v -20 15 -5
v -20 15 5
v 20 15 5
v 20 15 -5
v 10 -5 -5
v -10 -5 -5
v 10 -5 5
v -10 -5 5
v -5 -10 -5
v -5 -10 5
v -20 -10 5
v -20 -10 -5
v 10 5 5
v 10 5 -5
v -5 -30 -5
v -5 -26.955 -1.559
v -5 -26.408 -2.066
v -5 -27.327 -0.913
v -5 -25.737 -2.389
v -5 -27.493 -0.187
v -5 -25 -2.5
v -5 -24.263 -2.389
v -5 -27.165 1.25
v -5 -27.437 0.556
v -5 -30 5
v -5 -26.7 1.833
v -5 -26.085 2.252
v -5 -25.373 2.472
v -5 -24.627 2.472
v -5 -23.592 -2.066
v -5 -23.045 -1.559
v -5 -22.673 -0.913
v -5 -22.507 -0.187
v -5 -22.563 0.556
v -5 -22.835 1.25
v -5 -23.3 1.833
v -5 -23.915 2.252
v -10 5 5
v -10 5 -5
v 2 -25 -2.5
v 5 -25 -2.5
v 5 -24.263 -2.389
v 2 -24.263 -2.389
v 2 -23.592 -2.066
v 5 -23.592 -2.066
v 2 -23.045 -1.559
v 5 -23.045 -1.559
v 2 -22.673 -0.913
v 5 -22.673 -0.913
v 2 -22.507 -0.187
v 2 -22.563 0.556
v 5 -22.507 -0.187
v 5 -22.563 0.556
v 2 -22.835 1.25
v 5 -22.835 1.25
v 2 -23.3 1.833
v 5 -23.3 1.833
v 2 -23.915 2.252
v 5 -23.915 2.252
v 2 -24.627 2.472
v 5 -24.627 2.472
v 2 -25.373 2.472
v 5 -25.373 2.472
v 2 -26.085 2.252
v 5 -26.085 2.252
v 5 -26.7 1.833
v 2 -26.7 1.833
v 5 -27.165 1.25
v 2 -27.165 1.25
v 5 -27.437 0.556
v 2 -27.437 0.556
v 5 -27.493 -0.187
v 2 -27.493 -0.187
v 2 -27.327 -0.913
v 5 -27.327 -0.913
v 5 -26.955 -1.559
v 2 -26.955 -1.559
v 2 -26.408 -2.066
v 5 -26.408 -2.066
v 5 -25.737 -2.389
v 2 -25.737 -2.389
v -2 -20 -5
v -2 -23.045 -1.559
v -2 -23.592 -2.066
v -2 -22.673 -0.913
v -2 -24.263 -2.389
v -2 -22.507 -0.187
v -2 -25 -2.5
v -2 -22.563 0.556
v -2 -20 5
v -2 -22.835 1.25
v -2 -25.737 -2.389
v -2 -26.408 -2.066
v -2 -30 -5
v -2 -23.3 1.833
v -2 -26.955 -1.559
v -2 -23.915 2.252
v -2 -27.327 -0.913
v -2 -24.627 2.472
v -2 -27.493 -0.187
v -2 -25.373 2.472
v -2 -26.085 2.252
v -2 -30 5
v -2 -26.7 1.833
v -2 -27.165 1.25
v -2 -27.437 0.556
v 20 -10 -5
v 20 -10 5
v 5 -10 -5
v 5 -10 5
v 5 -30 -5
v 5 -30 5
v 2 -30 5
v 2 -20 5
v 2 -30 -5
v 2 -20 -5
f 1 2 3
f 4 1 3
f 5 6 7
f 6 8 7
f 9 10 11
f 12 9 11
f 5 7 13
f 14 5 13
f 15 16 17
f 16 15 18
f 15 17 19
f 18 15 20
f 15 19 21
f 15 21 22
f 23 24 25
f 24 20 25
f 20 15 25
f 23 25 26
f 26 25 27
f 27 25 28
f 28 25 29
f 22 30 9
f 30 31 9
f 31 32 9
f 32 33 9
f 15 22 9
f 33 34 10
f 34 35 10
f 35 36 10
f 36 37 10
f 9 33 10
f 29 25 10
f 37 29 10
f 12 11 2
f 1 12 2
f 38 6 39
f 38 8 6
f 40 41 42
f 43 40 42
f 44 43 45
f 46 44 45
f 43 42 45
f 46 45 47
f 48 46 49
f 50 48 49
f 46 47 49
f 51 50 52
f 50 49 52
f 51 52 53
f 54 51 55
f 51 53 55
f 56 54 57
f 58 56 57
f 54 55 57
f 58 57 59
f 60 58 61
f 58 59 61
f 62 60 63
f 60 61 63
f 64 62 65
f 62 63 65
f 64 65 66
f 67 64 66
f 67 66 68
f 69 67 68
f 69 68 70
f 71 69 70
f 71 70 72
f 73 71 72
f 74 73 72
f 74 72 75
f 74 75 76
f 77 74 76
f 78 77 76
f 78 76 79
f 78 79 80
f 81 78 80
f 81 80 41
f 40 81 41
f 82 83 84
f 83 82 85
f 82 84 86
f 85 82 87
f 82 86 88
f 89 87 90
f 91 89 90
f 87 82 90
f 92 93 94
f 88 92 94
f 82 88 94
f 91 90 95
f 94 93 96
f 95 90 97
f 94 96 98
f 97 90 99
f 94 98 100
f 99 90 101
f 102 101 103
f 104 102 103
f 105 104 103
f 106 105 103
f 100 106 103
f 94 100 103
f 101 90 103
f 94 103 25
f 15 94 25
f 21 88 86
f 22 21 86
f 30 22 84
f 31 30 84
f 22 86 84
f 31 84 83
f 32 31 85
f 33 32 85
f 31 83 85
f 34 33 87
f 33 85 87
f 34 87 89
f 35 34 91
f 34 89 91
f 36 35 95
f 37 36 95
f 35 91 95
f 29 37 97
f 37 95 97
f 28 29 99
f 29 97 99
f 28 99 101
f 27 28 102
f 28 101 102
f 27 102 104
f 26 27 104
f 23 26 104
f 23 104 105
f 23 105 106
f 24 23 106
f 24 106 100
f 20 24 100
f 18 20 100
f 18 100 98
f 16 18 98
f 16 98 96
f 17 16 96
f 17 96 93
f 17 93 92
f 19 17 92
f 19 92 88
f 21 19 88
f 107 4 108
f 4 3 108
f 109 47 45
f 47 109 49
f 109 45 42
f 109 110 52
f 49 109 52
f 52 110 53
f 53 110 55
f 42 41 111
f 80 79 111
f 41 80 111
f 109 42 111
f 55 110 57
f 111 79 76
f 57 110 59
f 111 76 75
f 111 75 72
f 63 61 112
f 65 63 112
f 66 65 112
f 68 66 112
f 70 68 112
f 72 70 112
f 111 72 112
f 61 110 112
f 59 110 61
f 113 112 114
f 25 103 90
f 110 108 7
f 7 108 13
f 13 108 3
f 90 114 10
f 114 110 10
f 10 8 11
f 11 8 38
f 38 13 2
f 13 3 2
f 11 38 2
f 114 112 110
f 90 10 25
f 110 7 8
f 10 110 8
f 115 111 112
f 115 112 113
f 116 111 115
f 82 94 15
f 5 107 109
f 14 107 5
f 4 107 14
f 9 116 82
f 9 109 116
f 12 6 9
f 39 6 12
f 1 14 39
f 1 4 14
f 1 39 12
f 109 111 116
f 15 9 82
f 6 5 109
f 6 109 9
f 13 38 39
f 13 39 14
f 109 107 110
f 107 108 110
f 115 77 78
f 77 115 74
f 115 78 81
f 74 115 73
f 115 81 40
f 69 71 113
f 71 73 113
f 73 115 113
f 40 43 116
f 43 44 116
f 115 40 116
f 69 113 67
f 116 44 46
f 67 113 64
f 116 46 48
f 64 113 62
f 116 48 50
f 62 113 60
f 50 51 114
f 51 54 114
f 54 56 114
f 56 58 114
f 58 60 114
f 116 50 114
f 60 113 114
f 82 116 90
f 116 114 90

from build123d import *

# Parameters (mm, degrees)
BOSS_EXTRU_1_DEPTH      = 5
BOSS_EXTRU_1_DEPTH_BACK = 5
ESQUISSE1_W             = 20
ESQUISSE1_H             = 10
ESQUISSE3_R             = 2.5
ENL_V_MAT_EXTRU_1_DEPTH = 40.37003937


with BuildPart() as part:
    # Esquisse1 → Boss.-Extru.1 (new, two sides: drawn at the far end of the back side and taken through both)
    with BuildSketch(Plane.XY.offset(-BOSS_EXTRU_1_DEPTH_BACK)):
        Polygon((-20, 15), (20, 15), (20, -10), (5, -10), (5, -30), (2, -30), (2, -20), (-2, -20), (-2, -30), (-5, -30), (-5, -10), (-20, -10), align=None)
        Rectangle(ESQUISSE1_W, ESQUISSE1_H, mode=Mode.SUBTRACT)
    extrude(amount=BOSS_EXTRU_1_DEPTH + BOSS_EXTRU_1_DEPTH_BACK)

    # Esquisse3 → Enlèv. mat.-Extru.1 (cut, through all)
    with BuildSketch(Plane(origin=(5, 0, 0), x_dir=(0, 0, -1), z_dir=(1, 0, 0))):
        with Locations((0, -25)):
            Circle(ESQUISSE3_R)
    extrude(amount=-ENL_V_MAT_EXTRU_1_DEPTH, mode=Mode.SUBTRACT)


solid = part.part
